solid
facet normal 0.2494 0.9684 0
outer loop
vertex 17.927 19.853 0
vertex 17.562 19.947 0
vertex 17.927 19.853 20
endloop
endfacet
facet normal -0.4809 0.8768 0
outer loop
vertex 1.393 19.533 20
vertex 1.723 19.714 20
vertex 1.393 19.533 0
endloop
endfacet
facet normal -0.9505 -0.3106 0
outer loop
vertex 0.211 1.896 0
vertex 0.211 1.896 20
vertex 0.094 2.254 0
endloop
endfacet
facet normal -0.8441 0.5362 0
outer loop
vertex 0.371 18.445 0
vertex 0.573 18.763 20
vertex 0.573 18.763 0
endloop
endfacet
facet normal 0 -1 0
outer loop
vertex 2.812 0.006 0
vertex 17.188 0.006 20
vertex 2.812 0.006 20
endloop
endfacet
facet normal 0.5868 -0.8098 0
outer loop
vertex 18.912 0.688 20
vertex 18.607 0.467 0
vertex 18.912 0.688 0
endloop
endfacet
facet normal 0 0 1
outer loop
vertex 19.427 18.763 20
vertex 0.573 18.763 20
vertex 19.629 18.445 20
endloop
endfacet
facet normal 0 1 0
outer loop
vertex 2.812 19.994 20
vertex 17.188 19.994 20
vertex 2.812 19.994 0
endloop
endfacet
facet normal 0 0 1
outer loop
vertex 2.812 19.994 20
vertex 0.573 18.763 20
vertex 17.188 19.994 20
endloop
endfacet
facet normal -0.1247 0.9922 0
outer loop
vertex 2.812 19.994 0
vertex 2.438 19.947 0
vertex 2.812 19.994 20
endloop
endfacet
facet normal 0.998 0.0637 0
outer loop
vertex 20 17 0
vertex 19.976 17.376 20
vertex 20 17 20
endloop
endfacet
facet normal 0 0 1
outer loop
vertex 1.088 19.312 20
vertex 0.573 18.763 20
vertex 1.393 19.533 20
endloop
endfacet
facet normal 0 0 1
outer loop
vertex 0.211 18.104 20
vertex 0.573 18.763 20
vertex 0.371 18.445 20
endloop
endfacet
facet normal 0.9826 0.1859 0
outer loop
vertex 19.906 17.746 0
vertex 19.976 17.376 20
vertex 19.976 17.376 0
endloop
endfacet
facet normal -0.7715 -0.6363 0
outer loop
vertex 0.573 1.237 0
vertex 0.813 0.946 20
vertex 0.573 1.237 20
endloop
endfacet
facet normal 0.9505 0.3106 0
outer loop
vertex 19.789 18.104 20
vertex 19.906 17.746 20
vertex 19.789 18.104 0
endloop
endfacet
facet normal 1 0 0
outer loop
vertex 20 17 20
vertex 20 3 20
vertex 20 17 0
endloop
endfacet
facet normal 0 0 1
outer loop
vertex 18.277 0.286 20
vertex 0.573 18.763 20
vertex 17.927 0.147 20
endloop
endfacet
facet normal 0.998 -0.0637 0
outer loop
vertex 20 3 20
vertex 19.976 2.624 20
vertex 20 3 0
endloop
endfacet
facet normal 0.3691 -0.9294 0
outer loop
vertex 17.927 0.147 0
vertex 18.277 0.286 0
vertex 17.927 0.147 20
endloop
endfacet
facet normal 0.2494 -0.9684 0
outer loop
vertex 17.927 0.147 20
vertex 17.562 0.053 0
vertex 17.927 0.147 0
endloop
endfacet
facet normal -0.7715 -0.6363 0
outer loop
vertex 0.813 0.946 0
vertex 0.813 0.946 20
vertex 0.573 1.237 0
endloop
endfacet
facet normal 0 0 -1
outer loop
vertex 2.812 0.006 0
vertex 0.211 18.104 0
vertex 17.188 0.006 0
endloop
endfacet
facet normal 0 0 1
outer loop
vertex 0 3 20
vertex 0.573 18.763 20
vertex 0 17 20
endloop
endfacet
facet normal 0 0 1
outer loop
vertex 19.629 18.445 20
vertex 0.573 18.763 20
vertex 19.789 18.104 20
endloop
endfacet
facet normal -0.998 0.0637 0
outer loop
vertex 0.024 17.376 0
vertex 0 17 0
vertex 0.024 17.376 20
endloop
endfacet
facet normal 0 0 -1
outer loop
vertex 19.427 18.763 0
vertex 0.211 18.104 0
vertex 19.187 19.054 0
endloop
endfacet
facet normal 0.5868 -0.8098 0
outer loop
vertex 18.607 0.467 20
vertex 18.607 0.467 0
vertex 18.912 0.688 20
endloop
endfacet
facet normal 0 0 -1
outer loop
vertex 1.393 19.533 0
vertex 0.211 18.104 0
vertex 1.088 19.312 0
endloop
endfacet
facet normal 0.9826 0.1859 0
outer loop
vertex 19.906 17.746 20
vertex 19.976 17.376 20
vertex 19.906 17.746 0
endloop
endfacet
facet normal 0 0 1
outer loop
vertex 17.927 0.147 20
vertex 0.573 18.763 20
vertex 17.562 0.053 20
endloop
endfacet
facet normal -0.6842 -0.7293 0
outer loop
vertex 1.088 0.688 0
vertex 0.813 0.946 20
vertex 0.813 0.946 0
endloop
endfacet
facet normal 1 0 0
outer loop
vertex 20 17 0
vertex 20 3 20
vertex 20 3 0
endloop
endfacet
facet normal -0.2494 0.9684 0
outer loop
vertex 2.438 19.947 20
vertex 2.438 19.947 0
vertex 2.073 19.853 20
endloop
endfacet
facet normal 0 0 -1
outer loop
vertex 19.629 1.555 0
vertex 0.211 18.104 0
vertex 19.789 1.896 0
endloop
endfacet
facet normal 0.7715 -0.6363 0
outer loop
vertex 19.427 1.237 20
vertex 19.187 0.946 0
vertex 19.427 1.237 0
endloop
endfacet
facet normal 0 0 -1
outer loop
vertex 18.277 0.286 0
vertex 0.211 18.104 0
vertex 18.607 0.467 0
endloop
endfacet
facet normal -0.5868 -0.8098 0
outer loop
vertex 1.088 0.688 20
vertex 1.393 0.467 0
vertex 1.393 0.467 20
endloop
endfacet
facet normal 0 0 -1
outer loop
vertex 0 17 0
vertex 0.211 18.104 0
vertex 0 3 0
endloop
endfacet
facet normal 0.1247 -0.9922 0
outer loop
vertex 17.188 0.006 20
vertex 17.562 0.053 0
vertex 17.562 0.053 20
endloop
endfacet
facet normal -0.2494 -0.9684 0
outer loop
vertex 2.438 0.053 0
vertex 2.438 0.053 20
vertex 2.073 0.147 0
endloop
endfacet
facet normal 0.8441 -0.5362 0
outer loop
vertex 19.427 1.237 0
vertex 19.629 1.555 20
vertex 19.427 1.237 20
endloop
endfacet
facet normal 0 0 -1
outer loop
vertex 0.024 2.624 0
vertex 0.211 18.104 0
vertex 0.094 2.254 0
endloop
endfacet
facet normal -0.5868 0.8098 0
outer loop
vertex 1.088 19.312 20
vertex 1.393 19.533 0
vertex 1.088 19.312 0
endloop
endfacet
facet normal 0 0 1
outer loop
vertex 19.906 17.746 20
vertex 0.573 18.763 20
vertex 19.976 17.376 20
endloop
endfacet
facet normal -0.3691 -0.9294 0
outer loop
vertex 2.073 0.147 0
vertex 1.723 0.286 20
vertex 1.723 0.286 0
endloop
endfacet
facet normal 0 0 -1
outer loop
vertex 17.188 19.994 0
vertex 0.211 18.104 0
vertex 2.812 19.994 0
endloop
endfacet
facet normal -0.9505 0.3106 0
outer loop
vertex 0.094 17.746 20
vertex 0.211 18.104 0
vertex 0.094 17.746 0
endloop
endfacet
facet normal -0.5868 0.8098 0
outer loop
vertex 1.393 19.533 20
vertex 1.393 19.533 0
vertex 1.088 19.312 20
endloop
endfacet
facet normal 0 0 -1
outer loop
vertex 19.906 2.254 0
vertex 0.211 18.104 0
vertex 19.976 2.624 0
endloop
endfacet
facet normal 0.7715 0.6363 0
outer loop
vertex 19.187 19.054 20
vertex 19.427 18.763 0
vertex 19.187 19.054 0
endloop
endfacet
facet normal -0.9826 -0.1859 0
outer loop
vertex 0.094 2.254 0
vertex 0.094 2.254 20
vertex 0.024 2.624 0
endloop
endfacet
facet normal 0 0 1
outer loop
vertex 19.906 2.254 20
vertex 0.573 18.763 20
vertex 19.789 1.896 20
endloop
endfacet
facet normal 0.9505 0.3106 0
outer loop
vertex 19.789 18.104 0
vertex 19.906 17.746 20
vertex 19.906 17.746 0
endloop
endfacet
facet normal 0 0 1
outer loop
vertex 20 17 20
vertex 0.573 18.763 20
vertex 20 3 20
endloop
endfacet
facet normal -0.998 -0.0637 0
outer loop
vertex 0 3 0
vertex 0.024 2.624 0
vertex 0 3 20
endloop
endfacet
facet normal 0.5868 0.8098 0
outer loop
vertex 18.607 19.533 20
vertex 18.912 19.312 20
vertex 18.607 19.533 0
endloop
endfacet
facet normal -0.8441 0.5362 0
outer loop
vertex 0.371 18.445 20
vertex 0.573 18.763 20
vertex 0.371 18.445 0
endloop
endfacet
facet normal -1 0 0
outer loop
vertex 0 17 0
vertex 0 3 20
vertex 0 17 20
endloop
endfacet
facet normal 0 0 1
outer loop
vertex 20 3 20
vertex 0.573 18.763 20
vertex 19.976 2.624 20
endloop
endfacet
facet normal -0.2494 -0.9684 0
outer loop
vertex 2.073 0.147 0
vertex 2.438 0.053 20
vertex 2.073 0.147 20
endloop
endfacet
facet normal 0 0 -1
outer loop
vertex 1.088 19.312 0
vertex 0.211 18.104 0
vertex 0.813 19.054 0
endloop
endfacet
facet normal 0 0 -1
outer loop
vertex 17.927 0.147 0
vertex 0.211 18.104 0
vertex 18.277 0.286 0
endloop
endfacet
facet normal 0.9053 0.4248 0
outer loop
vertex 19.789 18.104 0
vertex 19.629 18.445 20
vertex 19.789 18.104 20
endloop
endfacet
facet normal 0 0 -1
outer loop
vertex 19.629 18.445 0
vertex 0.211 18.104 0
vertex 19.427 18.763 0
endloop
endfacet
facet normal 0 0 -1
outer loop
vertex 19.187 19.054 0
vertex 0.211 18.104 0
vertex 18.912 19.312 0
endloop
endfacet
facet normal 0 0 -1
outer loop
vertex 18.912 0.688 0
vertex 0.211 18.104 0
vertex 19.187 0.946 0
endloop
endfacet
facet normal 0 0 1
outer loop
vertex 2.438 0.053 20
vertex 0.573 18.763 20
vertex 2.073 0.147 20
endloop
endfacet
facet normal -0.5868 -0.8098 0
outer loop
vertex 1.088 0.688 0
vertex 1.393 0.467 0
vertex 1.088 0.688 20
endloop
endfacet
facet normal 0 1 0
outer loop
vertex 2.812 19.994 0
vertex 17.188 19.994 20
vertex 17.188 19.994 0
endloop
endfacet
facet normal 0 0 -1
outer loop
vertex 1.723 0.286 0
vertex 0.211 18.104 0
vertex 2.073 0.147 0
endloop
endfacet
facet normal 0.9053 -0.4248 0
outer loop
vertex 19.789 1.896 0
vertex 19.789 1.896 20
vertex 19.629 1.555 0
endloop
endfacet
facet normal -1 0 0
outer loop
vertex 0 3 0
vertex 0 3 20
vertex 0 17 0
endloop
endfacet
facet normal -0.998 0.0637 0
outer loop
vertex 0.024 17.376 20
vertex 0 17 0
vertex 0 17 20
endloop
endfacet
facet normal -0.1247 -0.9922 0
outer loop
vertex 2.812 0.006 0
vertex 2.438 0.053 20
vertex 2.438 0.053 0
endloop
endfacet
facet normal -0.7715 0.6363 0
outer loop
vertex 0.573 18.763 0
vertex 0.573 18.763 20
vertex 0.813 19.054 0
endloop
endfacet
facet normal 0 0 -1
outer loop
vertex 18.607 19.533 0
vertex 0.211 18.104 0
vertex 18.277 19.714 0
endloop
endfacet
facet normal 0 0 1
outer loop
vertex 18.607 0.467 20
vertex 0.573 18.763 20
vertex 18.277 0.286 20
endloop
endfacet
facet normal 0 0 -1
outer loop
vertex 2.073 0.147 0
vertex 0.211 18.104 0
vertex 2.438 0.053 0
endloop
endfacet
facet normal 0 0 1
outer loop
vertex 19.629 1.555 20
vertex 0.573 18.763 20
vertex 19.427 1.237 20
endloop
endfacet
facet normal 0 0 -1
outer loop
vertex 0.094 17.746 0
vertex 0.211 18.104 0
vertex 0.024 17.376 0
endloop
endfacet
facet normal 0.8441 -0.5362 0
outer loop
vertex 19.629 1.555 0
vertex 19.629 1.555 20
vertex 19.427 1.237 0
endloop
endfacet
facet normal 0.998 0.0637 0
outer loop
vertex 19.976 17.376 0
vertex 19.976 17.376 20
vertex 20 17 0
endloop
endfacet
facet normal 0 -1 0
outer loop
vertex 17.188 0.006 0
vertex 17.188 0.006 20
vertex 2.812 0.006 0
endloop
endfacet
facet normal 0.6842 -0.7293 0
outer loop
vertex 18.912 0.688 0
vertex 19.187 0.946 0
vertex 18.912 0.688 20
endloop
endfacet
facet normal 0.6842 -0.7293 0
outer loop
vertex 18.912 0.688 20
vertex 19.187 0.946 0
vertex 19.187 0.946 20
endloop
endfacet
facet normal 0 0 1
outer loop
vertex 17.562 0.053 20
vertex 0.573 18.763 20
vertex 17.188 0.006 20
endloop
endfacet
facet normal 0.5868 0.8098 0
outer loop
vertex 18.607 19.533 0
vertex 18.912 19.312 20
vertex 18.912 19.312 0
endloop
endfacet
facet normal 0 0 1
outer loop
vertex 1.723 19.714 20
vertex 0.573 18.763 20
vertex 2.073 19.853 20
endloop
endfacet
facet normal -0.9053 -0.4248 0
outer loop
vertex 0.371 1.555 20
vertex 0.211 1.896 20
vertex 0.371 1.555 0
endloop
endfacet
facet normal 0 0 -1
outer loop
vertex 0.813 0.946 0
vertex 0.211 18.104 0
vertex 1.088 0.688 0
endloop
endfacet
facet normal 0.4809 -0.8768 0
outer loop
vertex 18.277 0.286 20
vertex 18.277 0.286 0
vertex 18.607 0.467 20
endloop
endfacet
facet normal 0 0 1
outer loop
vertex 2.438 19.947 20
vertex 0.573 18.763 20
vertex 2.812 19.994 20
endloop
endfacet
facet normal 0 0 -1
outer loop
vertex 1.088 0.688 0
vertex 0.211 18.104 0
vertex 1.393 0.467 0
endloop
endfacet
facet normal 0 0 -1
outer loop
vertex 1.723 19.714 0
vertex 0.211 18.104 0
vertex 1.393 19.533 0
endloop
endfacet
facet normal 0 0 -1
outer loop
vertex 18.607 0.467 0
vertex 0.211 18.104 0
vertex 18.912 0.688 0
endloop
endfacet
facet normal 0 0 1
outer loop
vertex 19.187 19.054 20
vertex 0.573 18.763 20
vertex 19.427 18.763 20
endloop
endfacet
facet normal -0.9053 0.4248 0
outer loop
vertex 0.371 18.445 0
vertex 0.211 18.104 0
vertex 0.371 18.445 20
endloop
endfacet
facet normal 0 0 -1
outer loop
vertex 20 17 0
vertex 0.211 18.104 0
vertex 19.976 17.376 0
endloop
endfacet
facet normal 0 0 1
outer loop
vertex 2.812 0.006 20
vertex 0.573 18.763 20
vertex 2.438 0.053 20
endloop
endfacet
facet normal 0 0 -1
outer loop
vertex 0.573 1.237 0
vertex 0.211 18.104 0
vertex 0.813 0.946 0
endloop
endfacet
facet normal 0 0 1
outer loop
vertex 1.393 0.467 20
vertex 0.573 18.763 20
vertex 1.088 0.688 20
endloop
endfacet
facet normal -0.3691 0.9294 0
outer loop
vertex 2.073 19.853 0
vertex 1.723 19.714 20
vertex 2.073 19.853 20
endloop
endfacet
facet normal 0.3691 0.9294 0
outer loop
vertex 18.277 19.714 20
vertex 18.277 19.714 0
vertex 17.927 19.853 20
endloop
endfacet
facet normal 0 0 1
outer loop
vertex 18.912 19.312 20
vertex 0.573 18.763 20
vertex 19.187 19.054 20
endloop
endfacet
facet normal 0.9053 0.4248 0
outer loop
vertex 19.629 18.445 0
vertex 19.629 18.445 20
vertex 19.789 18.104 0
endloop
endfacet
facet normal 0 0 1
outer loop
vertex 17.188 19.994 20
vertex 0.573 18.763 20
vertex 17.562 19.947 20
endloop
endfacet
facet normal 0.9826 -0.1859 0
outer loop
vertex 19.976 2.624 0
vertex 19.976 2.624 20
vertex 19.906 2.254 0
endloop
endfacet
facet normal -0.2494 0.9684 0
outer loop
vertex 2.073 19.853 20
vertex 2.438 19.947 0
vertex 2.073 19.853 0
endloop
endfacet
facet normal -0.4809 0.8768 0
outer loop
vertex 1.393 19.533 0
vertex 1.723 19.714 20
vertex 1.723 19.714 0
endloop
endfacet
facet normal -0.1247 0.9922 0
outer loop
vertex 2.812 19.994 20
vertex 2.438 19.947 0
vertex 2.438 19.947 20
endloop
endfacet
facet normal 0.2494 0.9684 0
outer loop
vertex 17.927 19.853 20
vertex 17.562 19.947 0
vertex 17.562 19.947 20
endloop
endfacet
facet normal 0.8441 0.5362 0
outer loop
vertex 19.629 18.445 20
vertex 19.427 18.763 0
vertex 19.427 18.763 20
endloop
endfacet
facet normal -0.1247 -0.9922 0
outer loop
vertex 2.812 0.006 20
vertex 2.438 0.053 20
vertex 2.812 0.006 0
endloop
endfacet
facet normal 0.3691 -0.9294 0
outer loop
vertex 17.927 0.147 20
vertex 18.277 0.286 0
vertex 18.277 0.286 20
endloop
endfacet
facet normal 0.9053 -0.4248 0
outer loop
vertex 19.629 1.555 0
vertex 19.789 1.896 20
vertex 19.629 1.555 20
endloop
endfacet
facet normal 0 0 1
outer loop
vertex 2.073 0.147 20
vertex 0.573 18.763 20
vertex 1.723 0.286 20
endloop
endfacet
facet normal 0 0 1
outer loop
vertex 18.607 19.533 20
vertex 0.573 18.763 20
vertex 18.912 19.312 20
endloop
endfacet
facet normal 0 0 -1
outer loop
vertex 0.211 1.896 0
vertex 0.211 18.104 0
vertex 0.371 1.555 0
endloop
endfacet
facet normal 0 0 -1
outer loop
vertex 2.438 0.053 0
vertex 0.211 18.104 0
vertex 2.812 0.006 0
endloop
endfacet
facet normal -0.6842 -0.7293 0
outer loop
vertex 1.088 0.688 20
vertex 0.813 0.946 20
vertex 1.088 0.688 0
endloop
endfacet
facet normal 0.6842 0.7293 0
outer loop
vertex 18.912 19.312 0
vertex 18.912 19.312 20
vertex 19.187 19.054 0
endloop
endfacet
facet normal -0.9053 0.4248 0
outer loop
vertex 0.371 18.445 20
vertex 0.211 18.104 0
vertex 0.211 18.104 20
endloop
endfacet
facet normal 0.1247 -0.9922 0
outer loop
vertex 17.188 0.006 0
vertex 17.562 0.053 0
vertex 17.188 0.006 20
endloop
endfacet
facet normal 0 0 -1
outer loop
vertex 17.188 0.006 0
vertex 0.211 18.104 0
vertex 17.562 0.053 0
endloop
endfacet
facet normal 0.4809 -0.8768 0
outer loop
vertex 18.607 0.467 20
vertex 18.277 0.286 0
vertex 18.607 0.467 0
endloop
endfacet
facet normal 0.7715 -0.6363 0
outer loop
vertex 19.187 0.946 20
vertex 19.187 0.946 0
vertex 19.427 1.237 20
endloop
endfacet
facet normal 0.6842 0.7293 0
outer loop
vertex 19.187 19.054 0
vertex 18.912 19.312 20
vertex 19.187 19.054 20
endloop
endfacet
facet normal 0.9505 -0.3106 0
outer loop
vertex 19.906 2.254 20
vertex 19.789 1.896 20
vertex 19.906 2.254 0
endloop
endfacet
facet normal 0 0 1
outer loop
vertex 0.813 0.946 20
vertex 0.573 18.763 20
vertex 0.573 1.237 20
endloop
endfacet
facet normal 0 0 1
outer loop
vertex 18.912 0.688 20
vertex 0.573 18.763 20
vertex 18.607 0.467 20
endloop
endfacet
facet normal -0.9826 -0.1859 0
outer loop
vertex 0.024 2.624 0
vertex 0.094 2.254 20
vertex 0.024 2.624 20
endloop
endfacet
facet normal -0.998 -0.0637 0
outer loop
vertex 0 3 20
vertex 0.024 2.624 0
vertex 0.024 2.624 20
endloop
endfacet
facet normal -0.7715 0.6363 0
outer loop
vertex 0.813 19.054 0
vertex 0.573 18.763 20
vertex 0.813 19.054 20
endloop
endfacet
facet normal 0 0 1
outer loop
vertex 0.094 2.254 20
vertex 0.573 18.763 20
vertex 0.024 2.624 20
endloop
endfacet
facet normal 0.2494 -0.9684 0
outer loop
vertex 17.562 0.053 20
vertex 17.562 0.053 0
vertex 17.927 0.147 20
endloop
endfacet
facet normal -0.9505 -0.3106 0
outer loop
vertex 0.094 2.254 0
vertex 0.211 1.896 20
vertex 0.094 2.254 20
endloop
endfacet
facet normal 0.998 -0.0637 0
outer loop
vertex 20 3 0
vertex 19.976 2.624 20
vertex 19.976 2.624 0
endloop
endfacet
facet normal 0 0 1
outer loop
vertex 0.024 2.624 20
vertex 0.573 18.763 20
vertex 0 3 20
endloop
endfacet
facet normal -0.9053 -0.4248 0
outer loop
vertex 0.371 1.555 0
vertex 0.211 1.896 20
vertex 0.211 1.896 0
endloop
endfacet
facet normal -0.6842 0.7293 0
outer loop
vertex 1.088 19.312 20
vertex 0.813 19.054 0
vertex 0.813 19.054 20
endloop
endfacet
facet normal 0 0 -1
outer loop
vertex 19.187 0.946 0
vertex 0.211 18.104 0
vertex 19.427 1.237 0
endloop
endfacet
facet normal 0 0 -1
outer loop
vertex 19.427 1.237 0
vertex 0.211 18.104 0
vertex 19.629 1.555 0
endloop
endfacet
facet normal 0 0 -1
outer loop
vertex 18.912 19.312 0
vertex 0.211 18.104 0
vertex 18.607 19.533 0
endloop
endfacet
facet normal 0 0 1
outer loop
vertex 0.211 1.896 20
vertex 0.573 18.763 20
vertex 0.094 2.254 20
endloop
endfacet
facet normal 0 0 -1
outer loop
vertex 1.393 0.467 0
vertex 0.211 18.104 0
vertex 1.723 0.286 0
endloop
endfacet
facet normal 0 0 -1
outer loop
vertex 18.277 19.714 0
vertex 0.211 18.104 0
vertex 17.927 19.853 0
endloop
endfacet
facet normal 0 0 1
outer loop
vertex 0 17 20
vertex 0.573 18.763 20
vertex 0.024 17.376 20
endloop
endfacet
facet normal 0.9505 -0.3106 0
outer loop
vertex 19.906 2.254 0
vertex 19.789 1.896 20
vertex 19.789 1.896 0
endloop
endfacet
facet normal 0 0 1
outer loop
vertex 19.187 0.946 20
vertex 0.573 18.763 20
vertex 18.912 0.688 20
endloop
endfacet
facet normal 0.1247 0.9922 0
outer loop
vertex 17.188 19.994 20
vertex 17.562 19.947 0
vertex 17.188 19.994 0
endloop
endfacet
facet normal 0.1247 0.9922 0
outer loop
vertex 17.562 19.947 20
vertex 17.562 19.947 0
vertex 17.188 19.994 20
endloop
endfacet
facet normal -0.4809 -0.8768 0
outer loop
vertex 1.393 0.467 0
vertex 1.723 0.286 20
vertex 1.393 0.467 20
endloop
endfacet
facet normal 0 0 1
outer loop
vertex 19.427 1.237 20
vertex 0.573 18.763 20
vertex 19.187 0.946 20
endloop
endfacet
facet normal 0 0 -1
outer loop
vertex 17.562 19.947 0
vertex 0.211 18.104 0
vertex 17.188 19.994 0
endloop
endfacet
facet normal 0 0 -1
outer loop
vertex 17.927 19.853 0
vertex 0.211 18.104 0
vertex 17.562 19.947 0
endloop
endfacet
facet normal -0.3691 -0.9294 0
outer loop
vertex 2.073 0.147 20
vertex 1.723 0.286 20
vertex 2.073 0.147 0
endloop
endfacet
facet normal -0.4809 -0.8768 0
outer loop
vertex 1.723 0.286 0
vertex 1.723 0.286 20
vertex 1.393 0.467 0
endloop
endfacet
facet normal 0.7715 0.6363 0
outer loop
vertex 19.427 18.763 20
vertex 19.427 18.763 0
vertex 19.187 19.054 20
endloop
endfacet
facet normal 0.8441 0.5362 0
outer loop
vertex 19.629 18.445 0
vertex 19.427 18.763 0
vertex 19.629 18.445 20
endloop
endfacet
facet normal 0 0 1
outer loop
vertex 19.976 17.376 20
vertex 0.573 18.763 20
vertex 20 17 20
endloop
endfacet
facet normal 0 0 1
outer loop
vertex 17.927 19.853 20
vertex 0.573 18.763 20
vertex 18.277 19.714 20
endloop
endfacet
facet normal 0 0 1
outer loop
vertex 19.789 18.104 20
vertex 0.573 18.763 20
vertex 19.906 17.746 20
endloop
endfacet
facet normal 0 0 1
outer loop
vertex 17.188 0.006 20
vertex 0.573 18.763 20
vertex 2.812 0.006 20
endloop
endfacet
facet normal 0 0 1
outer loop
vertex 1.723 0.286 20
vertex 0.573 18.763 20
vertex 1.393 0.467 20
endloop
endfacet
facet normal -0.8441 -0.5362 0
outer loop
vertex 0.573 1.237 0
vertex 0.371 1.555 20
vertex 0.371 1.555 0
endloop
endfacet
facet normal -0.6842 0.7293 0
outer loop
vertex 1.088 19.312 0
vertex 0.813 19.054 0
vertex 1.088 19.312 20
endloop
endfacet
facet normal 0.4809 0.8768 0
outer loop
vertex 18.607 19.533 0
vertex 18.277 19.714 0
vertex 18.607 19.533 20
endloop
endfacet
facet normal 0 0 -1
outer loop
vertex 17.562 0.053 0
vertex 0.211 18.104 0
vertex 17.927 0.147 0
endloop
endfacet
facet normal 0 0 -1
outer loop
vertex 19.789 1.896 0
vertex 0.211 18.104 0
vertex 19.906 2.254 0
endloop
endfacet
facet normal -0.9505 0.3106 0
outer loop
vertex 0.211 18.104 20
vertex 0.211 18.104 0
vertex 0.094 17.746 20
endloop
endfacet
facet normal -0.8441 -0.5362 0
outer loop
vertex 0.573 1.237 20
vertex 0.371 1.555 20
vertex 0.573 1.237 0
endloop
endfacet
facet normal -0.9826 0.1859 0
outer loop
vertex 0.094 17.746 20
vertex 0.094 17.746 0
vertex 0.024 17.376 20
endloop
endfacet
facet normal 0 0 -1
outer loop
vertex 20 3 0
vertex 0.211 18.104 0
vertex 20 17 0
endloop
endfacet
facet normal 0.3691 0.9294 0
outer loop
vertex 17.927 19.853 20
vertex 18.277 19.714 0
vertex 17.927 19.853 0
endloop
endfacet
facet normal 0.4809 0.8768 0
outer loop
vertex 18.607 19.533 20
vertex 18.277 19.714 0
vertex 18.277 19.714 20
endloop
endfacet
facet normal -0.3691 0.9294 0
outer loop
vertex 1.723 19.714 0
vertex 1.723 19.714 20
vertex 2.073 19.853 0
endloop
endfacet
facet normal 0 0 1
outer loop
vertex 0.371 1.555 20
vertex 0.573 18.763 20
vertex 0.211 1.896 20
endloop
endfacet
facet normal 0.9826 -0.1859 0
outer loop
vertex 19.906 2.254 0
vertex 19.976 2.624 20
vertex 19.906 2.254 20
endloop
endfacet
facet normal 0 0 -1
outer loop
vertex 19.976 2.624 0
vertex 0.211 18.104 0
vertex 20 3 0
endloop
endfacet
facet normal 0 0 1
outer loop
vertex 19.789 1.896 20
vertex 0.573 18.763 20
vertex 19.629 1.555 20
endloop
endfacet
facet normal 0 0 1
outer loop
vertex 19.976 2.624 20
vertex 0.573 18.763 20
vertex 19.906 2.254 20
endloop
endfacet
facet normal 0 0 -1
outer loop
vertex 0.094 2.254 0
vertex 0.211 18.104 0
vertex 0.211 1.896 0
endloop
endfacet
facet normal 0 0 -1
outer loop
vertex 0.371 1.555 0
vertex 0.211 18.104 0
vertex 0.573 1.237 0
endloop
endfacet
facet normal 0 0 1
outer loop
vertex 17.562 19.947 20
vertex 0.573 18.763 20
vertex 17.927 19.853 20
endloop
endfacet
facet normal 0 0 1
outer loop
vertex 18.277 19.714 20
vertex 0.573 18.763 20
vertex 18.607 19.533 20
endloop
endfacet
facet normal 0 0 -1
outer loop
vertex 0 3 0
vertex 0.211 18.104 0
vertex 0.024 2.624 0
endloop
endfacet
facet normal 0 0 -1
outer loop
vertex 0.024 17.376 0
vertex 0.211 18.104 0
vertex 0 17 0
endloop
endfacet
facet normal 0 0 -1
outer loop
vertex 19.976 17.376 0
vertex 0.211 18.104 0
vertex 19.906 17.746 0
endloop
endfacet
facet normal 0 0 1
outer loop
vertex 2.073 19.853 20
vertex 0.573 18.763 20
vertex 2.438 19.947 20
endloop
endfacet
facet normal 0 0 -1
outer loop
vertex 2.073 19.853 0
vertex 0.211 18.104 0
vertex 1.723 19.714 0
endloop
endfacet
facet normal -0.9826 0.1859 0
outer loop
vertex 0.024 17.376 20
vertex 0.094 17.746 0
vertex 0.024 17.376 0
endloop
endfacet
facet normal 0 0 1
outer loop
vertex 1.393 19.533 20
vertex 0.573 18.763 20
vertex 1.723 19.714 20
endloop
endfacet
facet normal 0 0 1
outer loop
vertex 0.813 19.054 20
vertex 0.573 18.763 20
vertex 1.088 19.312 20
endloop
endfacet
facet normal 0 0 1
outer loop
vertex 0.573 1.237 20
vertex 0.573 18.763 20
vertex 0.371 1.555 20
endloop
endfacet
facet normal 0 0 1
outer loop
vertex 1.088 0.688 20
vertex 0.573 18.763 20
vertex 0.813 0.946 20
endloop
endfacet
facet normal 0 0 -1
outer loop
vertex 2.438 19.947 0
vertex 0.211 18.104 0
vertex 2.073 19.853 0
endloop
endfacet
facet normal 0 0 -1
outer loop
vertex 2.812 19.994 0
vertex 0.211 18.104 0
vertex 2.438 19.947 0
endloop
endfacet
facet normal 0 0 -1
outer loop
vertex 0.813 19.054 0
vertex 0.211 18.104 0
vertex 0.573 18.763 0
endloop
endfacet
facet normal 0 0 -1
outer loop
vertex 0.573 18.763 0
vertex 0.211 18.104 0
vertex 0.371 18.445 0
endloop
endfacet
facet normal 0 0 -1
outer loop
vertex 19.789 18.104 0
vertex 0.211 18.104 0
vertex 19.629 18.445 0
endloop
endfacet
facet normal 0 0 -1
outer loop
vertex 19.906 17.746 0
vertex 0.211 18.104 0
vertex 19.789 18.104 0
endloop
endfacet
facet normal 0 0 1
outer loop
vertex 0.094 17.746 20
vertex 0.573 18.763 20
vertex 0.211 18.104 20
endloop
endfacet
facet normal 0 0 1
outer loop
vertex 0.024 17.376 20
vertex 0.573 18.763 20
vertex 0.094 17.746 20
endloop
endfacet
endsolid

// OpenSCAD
// file: ../flat_rounded_cube.scad
$bleed = 1;
$rounding = 3;

min_cylinder_height = 1;

module flat_rounded_cube(size) {
  width = size[0] - $rounding * 2;
  length = size[1] - $rounding * 2;

  // Only 1 count of min_cynlinder_height not 2;
  // cylinder does not extend the bottom because it's flush
  height = size[2] - min_cylinder_height; 

  minkowski() {
    translate([$rounding, $rounding, 0]) {
      cube([width, length, height]);
    }
    cylinder(min_cylinder_height, $rounding, $rounding);
  }
}
// main file
echo(version=version());

include <../../lib/flat_rounded_cube.scad>

$rounding = 3;
$fn = 50;

flat_rounded_cube([20, 20, 20]);
